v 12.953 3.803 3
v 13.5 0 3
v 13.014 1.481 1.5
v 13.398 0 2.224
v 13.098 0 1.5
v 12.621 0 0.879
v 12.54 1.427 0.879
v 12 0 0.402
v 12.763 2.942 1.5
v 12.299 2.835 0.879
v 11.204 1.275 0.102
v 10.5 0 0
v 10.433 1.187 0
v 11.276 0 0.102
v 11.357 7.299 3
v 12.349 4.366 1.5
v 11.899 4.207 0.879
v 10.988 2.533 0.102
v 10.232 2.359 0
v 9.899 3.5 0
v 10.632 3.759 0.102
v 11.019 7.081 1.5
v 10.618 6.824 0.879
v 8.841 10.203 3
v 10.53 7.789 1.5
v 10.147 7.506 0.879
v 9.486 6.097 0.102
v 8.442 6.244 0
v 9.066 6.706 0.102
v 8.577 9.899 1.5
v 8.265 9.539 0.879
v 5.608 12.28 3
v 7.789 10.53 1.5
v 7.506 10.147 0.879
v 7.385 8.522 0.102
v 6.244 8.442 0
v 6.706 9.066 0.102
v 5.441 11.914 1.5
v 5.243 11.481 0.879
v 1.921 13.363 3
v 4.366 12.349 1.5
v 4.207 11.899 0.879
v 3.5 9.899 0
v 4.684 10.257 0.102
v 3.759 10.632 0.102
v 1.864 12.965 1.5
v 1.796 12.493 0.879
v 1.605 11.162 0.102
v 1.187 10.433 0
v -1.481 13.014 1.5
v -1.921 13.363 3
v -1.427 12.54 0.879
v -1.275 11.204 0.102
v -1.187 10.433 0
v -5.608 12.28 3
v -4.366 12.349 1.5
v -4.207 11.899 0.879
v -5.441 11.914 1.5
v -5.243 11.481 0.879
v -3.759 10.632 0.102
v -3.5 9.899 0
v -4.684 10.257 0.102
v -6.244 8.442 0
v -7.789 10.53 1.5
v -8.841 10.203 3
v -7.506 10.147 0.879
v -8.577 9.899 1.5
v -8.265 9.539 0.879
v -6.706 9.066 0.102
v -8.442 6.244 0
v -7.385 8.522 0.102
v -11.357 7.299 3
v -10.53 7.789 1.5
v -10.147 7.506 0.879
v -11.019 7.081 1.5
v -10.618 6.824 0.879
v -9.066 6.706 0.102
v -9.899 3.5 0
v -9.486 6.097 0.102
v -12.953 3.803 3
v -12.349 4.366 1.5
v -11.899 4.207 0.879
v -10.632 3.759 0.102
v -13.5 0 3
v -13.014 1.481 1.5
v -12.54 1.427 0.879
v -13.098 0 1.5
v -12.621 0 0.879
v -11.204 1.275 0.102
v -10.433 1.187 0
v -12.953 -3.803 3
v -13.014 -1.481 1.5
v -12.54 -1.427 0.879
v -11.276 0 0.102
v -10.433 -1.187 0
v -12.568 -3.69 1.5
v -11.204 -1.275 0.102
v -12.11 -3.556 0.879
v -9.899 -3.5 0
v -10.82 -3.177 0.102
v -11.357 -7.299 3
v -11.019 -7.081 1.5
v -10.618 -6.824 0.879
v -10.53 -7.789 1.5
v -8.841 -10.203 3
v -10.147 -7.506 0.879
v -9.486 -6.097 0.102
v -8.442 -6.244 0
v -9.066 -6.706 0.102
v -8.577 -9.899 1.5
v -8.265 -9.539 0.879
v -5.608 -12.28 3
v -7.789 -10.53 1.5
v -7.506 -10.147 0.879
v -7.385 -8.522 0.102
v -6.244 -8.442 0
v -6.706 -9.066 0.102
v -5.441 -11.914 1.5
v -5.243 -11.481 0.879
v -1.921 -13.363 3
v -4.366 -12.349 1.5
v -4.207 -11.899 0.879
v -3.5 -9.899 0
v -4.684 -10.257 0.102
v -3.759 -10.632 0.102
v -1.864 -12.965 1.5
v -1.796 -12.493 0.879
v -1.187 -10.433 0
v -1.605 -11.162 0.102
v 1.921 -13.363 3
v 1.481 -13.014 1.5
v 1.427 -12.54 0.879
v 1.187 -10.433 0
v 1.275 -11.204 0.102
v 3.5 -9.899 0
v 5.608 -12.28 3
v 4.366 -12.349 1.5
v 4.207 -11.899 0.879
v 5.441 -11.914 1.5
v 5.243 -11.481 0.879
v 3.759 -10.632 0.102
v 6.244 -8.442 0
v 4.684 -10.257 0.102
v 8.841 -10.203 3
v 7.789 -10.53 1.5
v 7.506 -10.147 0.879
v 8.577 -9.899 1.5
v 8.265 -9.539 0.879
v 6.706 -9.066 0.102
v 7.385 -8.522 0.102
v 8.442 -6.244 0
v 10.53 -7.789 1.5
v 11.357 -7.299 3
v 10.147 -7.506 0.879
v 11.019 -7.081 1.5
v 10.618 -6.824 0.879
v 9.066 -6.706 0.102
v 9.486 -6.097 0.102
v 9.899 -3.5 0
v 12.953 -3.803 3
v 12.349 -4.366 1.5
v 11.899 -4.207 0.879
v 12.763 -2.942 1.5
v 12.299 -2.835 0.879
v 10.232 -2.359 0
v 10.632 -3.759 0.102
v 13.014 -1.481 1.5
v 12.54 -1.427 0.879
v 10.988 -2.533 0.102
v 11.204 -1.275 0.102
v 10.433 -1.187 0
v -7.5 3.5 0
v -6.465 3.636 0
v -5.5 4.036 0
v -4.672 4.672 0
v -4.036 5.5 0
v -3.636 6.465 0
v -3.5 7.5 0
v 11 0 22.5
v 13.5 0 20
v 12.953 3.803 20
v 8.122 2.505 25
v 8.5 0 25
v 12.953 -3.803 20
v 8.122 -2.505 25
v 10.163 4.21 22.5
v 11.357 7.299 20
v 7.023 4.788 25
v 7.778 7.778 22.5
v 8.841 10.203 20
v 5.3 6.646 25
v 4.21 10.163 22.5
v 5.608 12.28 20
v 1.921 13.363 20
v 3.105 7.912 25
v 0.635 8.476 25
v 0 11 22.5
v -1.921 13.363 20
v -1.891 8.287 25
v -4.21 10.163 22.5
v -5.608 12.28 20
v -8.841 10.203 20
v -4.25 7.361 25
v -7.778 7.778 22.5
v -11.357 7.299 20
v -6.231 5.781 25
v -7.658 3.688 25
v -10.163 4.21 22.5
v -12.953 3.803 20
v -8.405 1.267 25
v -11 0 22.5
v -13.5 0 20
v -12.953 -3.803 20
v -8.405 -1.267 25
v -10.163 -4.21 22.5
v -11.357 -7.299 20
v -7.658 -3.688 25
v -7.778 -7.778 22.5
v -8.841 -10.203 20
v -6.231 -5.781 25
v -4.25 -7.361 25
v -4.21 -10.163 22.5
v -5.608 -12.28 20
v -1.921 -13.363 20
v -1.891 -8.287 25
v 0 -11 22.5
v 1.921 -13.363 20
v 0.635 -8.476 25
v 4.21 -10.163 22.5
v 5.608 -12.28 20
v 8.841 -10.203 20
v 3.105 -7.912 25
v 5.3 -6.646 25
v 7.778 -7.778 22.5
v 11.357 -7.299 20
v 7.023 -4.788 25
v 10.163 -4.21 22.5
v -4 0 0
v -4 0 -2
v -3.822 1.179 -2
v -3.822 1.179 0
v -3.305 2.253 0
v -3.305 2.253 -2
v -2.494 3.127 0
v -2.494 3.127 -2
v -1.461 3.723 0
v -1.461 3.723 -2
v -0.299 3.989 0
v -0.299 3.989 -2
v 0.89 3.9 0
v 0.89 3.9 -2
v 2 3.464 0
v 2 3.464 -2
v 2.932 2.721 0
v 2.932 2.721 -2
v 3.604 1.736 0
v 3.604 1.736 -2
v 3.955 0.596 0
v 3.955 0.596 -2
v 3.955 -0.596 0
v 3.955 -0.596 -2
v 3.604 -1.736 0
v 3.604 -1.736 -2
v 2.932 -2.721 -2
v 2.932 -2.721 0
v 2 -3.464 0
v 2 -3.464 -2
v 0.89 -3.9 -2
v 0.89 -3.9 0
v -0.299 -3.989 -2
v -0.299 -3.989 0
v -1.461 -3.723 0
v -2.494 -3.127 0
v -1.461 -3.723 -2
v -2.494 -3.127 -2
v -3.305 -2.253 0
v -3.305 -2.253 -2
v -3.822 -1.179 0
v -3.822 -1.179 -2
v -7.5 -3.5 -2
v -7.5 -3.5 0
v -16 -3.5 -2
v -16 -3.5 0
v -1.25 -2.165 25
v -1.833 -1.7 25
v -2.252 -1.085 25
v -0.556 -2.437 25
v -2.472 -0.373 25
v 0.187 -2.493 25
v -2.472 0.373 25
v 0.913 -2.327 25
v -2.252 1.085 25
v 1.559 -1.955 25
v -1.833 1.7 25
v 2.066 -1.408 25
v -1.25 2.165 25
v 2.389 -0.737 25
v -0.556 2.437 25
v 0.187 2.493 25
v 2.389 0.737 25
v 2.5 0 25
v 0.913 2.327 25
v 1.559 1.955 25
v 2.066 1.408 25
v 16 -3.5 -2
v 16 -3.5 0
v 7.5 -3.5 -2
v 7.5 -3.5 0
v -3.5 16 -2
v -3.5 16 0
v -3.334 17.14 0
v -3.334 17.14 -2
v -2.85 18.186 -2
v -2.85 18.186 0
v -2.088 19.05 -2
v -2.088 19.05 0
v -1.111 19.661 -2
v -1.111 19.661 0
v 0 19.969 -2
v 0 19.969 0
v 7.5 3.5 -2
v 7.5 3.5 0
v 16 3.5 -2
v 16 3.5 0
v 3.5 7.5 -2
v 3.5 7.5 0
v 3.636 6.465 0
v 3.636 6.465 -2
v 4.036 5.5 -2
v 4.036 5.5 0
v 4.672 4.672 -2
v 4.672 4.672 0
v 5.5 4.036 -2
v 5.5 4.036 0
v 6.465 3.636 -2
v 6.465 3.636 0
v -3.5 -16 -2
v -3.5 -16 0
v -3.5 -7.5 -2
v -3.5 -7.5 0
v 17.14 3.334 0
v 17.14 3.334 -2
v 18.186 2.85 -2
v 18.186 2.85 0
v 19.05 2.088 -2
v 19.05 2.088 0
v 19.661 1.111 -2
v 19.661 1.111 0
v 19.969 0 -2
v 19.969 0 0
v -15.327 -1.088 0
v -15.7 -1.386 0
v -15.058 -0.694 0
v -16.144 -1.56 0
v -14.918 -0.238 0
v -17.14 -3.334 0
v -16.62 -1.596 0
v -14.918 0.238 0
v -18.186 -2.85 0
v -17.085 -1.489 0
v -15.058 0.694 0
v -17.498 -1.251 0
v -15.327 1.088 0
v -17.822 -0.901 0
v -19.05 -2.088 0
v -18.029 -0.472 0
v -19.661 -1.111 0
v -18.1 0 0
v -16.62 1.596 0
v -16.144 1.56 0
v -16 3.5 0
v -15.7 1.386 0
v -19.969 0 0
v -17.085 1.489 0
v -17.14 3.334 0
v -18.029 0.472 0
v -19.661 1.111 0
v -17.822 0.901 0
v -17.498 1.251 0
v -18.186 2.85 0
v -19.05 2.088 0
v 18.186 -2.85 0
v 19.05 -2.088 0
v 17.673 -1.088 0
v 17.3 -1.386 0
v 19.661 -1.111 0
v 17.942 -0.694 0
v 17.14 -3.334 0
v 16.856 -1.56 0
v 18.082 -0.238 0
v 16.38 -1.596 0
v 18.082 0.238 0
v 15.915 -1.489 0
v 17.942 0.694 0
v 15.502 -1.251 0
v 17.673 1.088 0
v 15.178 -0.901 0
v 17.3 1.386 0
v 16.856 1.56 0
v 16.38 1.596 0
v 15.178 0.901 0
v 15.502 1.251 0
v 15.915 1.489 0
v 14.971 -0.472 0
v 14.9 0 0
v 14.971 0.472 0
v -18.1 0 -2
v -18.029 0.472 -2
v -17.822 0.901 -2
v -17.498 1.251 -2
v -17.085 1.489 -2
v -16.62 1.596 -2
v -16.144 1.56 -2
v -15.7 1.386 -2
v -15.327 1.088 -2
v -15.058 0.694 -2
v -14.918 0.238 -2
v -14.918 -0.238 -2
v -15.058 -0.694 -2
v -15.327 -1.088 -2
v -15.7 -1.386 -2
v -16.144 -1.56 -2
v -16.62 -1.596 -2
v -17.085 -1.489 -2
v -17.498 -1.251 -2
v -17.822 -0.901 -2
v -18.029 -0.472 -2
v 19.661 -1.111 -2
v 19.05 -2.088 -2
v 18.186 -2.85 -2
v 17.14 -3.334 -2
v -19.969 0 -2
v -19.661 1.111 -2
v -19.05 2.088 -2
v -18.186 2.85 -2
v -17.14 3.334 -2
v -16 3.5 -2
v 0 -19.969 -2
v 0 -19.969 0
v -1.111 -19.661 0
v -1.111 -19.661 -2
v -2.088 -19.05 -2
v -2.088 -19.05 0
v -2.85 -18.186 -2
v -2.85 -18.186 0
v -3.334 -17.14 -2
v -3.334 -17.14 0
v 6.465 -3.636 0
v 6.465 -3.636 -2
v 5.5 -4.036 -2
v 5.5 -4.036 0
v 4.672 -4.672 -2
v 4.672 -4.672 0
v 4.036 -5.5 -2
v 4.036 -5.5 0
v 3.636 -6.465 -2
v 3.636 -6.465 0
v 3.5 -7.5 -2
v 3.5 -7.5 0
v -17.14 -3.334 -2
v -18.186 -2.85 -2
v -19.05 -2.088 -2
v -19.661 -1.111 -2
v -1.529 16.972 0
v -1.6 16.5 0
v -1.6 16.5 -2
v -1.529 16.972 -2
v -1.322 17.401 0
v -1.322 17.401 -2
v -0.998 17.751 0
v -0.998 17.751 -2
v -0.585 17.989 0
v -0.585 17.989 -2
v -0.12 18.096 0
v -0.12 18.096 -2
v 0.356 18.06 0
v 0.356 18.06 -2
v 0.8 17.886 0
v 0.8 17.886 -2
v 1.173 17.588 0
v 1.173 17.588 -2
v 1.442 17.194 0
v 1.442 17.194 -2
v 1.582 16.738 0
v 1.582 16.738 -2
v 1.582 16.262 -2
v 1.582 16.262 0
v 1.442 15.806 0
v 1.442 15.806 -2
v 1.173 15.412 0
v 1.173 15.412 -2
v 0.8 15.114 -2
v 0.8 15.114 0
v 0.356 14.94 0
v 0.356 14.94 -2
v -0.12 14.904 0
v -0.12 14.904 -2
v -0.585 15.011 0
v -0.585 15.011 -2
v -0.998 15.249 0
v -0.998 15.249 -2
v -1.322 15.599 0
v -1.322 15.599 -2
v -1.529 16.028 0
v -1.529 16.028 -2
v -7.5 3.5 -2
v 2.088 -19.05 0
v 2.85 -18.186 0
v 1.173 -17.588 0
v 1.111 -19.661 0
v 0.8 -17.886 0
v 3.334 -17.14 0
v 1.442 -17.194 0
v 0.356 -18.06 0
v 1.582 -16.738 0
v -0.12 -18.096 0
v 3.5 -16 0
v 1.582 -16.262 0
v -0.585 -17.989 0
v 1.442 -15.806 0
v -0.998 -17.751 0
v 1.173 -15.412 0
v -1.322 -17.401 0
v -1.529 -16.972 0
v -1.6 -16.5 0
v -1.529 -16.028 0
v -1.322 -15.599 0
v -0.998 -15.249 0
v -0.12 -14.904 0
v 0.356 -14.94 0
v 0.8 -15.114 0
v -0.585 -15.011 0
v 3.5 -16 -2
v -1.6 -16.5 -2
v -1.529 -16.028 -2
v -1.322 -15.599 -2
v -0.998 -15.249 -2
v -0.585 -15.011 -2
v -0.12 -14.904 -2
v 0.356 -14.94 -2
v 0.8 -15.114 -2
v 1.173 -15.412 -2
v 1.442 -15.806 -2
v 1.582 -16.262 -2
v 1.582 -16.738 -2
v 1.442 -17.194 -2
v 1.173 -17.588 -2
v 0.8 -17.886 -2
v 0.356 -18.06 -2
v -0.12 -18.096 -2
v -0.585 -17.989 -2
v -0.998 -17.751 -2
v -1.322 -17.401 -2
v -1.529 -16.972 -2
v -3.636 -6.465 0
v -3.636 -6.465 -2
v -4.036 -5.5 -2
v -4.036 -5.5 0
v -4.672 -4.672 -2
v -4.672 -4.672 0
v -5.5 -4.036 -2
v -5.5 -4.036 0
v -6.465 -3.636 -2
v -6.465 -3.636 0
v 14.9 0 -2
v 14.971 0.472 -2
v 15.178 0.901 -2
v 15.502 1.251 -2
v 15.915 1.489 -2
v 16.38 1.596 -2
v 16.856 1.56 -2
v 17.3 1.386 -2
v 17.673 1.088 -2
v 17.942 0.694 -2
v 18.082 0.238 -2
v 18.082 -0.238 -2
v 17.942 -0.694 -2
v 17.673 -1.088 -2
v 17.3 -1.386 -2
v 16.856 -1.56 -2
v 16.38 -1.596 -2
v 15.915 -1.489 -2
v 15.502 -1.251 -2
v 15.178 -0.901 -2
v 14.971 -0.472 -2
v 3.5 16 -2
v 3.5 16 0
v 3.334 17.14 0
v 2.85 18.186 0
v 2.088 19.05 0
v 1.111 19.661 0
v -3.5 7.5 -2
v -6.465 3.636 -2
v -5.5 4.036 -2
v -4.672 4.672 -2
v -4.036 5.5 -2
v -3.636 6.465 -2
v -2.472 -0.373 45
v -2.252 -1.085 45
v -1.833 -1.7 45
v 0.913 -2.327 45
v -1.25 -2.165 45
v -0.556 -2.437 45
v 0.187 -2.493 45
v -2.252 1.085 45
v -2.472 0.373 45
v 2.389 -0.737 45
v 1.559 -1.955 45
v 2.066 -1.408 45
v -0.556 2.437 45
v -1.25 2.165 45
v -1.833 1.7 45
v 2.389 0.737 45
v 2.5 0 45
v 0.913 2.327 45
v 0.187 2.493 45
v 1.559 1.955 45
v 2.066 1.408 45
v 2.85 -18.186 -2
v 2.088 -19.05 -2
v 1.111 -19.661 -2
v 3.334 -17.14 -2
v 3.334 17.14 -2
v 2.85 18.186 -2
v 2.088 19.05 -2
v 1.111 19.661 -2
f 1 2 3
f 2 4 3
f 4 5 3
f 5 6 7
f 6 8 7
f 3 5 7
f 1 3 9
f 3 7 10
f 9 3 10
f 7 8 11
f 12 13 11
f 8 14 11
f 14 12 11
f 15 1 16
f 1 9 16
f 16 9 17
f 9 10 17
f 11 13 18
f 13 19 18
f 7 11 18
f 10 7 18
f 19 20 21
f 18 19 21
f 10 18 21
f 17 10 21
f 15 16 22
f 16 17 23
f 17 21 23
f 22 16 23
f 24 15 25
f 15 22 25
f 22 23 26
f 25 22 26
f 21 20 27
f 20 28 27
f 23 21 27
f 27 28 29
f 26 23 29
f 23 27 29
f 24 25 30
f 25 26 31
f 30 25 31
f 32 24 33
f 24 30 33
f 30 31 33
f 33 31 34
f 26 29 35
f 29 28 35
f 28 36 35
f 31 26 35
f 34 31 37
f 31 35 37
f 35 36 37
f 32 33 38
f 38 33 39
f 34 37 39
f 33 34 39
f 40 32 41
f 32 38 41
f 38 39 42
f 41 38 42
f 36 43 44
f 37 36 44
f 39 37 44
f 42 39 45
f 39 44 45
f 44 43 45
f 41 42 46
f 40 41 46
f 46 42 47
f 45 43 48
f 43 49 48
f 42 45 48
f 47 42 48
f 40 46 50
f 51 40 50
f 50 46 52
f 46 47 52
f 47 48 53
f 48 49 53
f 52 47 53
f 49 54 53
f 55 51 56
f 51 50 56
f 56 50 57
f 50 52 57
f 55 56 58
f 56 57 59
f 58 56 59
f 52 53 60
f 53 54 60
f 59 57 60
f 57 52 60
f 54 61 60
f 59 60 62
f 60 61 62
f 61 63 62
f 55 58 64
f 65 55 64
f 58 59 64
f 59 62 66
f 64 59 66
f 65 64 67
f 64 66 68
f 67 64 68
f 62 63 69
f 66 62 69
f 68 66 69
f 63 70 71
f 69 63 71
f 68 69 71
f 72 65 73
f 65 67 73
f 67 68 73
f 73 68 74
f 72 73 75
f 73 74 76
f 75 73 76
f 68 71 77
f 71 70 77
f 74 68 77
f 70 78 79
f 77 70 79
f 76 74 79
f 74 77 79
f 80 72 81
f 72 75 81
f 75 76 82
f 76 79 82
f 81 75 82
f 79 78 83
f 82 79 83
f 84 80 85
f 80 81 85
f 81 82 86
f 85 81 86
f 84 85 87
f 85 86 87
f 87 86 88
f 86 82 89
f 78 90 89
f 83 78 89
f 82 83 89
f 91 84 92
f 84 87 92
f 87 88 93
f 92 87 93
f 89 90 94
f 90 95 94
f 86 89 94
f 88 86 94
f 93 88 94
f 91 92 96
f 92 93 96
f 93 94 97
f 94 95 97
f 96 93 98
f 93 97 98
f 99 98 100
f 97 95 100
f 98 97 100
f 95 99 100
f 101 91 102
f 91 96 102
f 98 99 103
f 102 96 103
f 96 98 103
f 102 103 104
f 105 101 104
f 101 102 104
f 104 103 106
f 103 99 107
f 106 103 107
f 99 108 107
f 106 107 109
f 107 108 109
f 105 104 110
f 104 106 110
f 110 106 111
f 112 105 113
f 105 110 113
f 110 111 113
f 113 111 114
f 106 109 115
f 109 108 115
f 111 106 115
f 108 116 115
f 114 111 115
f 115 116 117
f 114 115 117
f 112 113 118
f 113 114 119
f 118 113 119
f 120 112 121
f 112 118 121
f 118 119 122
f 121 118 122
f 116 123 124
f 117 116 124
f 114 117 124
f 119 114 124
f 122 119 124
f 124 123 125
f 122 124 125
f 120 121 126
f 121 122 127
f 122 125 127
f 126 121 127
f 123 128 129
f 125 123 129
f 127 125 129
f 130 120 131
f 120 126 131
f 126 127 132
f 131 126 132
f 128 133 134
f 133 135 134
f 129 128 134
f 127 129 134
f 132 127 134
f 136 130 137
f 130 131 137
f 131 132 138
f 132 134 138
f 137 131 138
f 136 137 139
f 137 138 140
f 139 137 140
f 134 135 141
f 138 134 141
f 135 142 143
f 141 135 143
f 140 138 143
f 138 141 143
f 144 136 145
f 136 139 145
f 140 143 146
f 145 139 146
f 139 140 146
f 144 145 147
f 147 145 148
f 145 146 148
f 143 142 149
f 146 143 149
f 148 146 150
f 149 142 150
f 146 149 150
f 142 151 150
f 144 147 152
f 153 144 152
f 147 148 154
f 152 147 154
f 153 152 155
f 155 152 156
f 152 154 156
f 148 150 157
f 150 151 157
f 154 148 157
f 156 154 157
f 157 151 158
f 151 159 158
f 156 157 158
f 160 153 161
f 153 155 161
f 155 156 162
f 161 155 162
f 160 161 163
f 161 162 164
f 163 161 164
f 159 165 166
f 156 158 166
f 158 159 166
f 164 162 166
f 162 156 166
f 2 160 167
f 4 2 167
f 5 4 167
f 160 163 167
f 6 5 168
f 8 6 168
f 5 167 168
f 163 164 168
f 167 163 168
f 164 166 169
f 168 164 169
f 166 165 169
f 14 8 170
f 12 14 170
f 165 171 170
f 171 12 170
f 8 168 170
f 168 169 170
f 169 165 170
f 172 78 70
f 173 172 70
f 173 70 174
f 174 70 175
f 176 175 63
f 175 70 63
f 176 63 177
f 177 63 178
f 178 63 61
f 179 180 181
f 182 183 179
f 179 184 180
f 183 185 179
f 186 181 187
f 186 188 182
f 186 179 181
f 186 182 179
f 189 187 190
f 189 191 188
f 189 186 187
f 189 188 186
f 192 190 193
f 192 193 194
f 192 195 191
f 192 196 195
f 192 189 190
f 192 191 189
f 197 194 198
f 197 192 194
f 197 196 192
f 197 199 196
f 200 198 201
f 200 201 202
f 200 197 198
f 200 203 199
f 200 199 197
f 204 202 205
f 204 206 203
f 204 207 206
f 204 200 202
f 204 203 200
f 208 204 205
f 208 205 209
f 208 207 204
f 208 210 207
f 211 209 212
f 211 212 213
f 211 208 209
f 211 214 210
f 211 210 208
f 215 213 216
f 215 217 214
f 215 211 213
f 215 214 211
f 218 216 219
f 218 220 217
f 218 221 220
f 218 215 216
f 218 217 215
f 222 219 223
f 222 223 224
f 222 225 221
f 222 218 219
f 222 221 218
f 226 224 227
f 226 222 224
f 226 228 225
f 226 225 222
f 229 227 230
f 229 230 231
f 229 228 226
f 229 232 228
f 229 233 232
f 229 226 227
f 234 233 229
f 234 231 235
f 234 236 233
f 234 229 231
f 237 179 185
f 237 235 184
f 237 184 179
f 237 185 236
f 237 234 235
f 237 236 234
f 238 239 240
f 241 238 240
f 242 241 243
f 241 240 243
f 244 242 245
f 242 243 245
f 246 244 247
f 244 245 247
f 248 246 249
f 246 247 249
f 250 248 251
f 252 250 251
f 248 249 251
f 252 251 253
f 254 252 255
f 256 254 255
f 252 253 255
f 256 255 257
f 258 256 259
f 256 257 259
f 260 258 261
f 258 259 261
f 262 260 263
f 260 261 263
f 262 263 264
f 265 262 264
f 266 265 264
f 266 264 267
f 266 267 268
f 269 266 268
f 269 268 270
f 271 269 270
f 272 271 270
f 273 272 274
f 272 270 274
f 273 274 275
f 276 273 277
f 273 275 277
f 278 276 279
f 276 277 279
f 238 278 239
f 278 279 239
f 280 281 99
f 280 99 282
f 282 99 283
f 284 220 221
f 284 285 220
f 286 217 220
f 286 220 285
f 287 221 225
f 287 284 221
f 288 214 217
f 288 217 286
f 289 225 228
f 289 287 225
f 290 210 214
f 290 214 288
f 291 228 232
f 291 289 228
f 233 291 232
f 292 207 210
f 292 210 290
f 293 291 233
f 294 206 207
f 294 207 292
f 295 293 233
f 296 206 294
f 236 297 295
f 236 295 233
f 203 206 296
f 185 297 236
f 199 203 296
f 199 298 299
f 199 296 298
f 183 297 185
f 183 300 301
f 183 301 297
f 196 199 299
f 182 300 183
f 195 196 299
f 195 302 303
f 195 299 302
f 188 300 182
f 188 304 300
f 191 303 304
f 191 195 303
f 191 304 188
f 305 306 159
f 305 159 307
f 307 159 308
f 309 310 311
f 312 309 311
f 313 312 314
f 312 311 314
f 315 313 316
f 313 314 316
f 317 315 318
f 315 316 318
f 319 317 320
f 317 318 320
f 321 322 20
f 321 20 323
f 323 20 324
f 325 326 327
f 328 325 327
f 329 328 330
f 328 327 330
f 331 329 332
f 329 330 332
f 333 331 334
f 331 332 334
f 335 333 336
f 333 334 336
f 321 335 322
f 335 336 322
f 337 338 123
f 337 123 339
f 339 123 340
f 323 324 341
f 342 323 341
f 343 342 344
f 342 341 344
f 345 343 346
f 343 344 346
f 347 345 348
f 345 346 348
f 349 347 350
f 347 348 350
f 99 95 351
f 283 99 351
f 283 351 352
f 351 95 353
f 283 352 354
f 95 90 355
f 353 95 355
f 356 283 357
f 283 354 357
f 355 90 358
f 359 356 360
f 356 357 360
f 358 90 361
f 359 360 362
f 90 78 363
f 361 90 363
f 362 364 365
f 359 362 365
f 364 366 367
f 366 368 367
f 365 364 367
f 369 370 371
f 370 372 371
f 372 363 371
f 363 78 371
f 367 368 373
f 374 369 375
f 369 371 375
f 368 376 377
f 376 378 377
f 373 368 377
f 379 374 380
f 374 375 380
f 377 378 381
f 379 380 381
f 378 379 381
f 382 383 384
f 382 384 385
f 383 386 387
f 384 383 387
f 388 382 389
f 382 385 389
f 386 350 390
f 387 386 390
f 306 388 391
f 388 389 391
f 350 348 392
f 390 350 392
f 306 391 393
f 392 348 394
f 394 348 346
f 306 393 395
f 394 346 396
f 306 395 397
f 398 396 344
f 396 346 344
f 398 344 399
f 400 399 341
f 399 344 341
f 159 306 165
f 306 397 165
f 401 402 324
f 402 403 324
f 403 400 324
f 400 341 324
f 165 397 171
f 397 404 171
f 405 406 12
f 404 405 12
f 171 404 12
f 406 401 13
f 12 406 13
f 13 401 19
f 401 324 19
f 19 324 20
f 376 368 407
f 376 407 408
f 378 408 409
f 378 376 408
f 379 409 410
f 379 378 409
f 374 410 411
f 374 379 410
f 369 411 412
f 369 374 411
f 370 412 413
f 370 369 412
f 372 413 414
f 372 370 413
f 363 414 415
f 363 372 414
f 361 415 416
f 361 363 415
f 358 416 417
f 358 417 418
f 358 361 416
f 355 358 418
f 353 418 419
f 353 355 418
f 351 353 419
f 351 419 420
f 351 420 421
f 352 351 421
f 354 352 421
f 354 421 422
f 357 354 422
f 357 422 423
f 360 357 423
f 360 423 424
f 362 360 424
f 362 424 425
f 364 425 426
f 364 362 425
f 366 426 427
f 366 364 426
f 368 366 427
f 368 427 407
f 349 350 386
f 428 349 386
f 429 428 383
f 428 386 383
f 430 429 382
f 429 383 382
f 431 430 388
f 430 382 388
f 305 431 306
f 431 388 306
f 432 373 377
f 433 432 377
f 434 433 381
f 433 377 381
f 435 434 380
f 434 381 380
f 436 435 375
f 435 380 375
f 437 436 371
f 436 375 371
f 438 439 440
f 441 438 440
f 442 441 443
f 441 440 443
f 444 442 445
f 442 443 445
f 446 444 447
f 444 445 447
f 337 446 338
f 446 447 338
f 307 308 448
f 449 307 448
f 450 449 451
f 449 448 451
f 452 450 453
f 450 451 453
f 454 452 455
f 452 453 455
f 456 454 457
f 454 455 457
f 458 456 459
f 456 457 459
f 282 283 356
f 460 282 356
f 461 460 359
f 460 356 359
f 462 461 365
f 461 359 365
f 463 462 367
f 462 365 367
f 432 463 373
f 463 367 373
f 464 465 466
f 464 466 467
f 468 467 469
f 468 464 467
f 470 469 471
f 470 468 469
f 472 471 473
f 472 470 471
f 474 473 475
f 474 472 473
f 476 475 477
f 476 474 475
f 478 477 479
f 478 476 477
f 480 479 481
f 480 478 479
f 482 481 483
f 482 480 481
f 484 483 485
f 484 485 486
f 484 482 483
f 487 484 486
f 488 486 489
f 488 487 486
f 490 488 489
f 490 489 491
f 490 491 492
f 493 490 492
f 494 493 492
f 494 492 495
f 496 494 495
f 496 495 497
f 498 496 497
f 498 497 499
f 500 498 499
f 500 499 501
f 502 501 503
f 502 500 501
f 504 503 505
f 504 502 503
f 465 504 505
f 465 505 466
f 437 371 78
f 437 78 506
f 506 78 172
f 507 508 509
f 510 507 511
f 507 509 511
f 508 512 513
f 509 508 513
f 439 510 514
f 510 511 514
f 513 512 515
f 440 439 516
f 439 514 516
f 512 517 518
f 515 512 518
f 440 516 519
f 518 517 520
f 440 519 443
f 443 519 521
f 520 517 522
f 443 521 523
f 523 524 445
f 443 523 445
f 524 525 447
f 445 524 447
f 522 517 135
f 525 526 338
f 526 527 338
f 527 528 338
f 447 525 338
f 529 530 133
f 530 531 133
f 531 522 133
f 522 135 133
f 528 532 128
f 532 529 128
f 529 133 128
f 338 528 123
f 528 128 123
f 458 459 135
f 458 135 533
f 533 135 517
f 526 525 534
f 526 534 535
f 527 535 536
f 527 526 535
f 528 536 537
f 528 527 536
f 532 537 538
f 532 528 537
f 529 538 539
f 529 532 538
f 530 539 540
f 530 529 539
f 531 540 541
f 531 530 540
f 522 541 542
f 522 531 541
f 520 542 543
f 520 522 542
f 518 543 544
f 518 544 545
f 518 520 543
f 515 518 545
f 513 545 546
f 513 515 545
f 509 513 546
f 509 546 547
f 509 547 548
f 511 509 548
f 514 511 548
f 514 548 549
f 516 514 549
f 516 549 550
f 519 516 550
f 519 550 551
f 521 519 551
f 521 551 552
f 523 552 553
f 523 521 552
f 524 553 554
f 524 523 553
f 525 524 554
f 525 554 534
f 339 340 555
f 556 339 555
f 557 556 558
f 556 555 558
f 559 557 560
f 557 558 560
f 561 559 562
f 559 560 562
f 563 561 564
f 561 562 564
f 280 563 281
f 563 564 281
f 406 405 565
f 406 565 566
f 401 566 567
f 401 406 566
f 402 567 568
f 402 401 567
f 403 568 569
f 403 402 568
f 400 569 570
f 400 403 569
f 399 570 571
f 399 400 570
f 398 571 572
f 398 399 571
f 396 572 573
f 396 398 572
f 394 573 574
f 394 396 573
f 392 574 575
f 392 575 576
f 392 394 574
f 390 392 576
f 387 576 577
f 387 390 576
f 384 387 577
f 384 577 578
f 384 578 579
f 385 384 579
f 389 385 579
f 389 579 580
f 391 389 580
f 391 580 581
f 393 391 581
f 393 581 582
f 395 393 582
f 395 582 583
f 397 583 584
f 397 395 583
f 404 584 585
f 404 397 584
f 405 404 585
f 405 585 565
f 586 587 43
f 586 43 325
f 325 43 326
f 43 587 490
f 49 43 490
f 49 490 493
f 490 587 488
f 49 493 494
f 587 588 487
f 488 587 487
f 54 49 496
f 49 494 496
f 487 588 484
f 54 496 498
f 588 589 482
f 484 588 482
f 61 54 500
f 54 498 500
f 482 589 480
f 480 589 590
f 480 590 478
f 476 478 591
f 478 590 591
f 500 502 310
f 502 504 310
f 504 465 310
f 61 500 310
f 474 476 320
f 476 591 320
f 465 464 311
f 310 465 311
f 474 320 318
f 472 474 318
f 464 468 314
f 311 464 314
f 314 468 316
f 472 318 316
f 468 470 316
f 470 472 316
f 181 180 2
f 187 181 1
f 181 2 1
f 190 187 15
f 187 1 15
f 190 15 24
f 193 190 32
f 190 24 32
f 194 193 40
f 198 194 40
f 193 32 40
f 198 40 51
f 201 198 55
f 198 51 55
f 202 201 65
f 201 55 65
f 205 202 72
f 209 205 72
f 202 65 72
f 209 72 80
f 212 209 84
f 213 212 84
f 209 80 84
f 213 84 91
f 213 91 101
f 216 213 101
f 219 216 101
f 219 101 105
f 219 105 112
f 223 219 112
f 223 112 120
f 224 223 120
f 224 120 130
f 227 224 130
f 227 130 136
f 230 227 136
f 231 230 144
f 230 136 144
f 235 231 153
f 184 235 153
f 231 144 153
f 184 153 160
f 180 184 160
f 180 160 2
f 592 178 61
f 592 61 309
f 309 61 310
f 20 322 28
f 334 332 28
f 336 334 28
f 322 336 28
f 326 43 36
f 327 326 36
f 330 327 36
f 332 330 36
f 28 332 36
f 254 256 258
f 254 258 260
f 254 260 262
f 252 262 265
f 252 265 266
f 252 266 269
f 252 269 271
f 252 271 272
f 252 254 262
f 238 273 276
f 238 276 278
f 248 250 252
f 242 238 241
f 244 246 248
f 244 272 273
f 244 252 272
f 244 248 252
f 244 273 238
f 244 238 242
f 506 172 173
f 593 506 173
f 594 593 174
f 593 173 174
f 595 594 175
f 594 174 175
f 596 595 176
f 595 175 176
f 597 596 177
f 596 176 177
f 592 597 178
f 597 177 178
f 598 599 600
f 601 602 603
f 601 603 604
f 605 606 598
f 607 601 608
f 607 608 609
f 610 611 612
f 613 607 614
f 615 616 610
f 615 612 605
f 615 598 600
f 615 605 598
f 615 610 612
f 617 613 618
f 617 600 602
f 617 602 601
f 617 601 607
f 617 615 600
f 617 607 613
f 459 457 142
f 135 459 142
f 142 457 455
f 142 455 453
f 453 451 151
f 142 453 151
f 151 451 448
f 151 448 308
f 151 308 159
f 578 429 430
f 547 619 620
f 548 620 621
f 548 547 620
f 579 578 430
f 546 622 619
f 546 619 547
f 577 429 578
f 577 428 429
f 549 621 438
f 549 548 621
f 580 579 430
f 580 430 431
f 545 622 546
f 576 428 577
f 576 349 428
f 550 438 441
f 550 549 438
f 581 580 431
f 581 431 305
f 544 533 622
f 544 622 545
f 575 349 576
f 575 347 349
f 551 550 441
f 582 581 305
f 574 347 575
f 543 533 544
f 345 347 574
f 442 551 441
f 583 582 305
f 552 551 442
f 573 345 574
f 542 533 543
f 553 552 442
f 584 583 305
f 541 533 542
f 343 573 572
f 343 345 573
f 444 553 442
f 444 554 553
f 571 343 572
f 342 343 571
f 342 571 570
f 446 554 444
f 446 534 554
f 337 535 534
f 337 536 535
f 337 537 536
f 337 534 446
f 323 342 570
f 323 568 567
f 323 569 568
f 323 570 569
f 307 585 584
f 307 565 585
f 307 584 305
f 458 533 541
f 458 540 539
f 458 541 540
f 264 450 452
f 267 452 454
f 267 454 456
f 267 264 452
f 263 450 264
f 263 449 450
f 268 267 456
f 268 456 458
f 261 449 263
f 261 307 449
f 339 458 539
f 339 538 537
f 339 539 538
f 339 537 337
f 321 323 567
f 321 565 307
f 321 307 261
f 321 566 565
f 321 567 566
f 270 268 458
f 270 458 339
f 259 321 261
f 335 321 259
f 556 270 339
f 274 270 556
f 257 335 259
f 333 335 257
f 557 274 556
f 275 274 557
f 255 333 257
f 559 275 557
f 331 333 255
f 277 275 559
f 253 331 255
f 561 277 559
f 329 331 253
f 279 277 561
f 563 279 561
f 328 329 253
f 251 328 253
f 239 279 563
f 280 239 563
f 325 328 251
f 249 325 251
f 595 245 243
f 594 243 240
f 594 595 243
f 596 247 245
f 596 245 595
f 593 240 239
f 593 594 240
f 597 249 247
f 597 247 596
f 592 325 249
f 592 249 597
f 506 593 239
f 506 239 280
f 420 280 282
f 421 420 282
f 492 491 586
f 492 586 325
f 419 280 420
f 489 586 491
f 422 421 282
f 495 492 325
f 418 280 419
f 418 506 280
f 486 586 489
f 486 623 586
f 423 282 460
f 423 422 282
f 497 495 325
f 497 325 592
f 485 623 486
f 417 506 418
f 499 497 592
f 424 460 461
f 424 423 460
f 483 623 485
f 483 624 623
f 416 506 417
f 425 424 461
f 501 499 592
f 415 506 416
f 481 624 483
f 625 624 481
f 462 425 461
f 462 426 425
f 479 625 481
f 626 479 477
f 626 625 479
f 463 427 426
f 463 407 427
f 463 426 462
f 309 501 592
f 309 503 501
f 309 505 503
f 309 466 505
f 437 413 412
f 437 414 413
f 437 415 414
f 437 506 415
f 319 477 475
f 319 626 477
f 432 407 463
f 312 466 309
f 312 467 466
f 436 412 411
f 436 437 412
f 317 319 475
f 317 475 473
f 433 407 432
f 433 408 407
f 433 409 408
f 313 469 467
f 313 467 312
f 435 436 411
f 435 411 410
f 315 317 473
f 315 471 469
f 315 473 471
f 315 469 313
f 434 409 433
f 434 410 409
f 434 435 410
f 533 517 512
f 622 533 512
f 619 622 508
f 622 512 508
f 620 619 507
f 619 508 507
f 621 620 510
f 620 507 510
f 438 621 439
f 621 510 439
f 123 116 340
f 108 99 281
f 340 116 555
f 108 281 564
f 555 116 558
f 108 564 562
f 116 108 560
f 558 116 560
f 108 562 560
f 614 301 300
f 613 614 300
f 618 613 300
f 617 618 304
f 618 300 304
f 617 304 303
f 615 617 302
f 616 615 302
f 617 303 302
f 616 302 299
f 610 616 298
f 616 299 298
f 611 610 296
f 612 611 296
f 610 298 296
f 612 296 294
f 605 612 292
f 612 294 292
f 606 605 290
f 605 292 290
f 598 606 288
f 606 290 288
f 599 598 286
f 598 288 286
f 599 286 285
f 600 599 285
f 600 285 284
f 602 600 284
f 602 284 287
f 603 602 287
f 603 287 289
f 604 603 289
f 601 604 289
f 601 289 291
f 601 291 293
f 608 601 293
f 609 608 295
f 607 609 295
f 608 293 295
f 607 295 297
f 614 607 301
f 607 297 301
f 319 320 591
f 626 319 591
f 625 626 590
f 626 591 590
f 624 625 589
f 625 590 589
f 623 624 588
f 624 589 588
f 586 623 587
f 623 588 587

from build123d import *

# Parameters (mm, degrees)
SKETCH1_R           = 13.5
BOSS_EXTRUDE1_DEPTH = 25
SKETCH2_R           = 2.5
BOSS_EXTRUDE2_DEPTH = 20
FILLET1_R           = 3
CHAMFER1_SIZE       = 5
SKETCH3_R           = 1.6
BOSS_EXTRUDE3_DEPTH = 2
SKETCH4_R           = 4
CUT_EXTRUDE1_DEPTH  = 2


with BuildPart() as part:
    # Sketch1 → Boss-Extrude1 (new body)
    with BuildSketch(Plane.XY):
        Circle(SKETCH1_R)
    extrude(amount=BOSS_EXTRUDE1_DEPTH)

    # Sketch2 → Boss-Extrude2 (add)
    with BuildSketch(Plane.XY.offset(25)):
        Circle(SKETCH2_R)
    extrude(amount=BOSS_EXTRUDE2_DEPTH)

    # Fillet1
    fillet1_edges = [part.edges().sort_by_distance(p)[0] for p in [
        (-13.5, 0, 0),
    ]]
    fillet(fillet1_edges, radius=FILLET1_R)

    # Chamfer1
    chamfer1_edges = [part.edges().sort_by_distance(p)[0] for p in [
        (-13.5, 0, 25),
    ]]
    chamfer(chamfer1_edges, length=CHAMFER1_SIZE)

    # Sketch3 → Boss-Extrude3 (add)
    with BuildSketch(Plane(origin=(0, 0, 0), x_dir=(-1, 0, 0), z_dir=(0, 0, -1))):
        with BuildLine():
            Line((-3.5, -7.5), (-3.5, -16))
            ThreePointArc((-3.5, -16), (-2.5, -18.645751311), (0, -19.968626967))
            ThreePointArc((0, -19.968626967), (2.5, -18.645751311), (3.5, -16))
            Line((3.5, -16), (3.5, -7.5))
            ThreePointArc((3.5, -7.5), (4.671572875, -4.671572875), (7.5, -3.5))
            Line((7.5, -3.5), (16, -3.5))
            ThreePointArc((16, -3.5), (18.645751311, -2.5), (19.968626967, 0))
            ThreePointArc((19.968626967, 0), (18.645751311, 2.5), (16, 3.5))
            Line((16, 3.5), (7.5, 3.5))
            ThreePointArc((7.5, 3.5), (4.671572875, 4.671572875), (3.5, 7.5))
            Line((3.5, 7.5), (3.5, 16))
            ThreePointArc((3.5, 16), (2.5, 18.645751311), (0, 19.968626967))
            ThreePointArc((0, 19.968626967), (-2.5, 18.645751311), (-3.5, 16))
            Line((-3.5, 16), (-3.5, 7.5))
            ThreePointArc((-3.5, 7.5), (-4.671572875, 4.671572875), (-7.5, 3.5))
            Line((-7.5, 3.5), (-16, 3.5))
            ThreePointArc((-16, 3.5), (-18.645751311, 2.5), (-19.968626967, 0))
            ThreePointArc((-19.968626967, 0), (-18.645751311, -2.5), (-16, -3.5))
            Line((-16, -3.5), (-7.5, -3.5))
            ThreePointArc((-7.5, -3.5), (-4.671572875, -4.671572875), (-3.5, -7.5))
        make_face()
        with Locations((-16.5, 0)):
            Circle(SKETCH3_R, mode=Mode.SUBTRACT)
        with Locations((0, 16.5)):
            Circle(SKETCH3_R, mode=Mode.SUBTRACT)
        with Locations((16.5, 0)):
            Circle(SKETCH3_R, mode=Mode.SUBTRACT)
        with Locations((0, -16.5)):
            Circle(SKETCH3_R, mode=Mode.SUBTRACT)
    extrude(amount=BOSS_EXTRUDE3_DEPTH)

    # Sketch4 → Cut-Extrude1 (cut)
    with BuildSketch(Plane(origin=(0, 0, -2), x_dir=(-1, 0, 0), z_dir=(0, 0, -1))):
        Circle(SKETCH4_R)
    extrude(amount=-CUT_EXTRUDE1_DEPTH, mode=Mode.SUBTRACT)


solid = part.part
